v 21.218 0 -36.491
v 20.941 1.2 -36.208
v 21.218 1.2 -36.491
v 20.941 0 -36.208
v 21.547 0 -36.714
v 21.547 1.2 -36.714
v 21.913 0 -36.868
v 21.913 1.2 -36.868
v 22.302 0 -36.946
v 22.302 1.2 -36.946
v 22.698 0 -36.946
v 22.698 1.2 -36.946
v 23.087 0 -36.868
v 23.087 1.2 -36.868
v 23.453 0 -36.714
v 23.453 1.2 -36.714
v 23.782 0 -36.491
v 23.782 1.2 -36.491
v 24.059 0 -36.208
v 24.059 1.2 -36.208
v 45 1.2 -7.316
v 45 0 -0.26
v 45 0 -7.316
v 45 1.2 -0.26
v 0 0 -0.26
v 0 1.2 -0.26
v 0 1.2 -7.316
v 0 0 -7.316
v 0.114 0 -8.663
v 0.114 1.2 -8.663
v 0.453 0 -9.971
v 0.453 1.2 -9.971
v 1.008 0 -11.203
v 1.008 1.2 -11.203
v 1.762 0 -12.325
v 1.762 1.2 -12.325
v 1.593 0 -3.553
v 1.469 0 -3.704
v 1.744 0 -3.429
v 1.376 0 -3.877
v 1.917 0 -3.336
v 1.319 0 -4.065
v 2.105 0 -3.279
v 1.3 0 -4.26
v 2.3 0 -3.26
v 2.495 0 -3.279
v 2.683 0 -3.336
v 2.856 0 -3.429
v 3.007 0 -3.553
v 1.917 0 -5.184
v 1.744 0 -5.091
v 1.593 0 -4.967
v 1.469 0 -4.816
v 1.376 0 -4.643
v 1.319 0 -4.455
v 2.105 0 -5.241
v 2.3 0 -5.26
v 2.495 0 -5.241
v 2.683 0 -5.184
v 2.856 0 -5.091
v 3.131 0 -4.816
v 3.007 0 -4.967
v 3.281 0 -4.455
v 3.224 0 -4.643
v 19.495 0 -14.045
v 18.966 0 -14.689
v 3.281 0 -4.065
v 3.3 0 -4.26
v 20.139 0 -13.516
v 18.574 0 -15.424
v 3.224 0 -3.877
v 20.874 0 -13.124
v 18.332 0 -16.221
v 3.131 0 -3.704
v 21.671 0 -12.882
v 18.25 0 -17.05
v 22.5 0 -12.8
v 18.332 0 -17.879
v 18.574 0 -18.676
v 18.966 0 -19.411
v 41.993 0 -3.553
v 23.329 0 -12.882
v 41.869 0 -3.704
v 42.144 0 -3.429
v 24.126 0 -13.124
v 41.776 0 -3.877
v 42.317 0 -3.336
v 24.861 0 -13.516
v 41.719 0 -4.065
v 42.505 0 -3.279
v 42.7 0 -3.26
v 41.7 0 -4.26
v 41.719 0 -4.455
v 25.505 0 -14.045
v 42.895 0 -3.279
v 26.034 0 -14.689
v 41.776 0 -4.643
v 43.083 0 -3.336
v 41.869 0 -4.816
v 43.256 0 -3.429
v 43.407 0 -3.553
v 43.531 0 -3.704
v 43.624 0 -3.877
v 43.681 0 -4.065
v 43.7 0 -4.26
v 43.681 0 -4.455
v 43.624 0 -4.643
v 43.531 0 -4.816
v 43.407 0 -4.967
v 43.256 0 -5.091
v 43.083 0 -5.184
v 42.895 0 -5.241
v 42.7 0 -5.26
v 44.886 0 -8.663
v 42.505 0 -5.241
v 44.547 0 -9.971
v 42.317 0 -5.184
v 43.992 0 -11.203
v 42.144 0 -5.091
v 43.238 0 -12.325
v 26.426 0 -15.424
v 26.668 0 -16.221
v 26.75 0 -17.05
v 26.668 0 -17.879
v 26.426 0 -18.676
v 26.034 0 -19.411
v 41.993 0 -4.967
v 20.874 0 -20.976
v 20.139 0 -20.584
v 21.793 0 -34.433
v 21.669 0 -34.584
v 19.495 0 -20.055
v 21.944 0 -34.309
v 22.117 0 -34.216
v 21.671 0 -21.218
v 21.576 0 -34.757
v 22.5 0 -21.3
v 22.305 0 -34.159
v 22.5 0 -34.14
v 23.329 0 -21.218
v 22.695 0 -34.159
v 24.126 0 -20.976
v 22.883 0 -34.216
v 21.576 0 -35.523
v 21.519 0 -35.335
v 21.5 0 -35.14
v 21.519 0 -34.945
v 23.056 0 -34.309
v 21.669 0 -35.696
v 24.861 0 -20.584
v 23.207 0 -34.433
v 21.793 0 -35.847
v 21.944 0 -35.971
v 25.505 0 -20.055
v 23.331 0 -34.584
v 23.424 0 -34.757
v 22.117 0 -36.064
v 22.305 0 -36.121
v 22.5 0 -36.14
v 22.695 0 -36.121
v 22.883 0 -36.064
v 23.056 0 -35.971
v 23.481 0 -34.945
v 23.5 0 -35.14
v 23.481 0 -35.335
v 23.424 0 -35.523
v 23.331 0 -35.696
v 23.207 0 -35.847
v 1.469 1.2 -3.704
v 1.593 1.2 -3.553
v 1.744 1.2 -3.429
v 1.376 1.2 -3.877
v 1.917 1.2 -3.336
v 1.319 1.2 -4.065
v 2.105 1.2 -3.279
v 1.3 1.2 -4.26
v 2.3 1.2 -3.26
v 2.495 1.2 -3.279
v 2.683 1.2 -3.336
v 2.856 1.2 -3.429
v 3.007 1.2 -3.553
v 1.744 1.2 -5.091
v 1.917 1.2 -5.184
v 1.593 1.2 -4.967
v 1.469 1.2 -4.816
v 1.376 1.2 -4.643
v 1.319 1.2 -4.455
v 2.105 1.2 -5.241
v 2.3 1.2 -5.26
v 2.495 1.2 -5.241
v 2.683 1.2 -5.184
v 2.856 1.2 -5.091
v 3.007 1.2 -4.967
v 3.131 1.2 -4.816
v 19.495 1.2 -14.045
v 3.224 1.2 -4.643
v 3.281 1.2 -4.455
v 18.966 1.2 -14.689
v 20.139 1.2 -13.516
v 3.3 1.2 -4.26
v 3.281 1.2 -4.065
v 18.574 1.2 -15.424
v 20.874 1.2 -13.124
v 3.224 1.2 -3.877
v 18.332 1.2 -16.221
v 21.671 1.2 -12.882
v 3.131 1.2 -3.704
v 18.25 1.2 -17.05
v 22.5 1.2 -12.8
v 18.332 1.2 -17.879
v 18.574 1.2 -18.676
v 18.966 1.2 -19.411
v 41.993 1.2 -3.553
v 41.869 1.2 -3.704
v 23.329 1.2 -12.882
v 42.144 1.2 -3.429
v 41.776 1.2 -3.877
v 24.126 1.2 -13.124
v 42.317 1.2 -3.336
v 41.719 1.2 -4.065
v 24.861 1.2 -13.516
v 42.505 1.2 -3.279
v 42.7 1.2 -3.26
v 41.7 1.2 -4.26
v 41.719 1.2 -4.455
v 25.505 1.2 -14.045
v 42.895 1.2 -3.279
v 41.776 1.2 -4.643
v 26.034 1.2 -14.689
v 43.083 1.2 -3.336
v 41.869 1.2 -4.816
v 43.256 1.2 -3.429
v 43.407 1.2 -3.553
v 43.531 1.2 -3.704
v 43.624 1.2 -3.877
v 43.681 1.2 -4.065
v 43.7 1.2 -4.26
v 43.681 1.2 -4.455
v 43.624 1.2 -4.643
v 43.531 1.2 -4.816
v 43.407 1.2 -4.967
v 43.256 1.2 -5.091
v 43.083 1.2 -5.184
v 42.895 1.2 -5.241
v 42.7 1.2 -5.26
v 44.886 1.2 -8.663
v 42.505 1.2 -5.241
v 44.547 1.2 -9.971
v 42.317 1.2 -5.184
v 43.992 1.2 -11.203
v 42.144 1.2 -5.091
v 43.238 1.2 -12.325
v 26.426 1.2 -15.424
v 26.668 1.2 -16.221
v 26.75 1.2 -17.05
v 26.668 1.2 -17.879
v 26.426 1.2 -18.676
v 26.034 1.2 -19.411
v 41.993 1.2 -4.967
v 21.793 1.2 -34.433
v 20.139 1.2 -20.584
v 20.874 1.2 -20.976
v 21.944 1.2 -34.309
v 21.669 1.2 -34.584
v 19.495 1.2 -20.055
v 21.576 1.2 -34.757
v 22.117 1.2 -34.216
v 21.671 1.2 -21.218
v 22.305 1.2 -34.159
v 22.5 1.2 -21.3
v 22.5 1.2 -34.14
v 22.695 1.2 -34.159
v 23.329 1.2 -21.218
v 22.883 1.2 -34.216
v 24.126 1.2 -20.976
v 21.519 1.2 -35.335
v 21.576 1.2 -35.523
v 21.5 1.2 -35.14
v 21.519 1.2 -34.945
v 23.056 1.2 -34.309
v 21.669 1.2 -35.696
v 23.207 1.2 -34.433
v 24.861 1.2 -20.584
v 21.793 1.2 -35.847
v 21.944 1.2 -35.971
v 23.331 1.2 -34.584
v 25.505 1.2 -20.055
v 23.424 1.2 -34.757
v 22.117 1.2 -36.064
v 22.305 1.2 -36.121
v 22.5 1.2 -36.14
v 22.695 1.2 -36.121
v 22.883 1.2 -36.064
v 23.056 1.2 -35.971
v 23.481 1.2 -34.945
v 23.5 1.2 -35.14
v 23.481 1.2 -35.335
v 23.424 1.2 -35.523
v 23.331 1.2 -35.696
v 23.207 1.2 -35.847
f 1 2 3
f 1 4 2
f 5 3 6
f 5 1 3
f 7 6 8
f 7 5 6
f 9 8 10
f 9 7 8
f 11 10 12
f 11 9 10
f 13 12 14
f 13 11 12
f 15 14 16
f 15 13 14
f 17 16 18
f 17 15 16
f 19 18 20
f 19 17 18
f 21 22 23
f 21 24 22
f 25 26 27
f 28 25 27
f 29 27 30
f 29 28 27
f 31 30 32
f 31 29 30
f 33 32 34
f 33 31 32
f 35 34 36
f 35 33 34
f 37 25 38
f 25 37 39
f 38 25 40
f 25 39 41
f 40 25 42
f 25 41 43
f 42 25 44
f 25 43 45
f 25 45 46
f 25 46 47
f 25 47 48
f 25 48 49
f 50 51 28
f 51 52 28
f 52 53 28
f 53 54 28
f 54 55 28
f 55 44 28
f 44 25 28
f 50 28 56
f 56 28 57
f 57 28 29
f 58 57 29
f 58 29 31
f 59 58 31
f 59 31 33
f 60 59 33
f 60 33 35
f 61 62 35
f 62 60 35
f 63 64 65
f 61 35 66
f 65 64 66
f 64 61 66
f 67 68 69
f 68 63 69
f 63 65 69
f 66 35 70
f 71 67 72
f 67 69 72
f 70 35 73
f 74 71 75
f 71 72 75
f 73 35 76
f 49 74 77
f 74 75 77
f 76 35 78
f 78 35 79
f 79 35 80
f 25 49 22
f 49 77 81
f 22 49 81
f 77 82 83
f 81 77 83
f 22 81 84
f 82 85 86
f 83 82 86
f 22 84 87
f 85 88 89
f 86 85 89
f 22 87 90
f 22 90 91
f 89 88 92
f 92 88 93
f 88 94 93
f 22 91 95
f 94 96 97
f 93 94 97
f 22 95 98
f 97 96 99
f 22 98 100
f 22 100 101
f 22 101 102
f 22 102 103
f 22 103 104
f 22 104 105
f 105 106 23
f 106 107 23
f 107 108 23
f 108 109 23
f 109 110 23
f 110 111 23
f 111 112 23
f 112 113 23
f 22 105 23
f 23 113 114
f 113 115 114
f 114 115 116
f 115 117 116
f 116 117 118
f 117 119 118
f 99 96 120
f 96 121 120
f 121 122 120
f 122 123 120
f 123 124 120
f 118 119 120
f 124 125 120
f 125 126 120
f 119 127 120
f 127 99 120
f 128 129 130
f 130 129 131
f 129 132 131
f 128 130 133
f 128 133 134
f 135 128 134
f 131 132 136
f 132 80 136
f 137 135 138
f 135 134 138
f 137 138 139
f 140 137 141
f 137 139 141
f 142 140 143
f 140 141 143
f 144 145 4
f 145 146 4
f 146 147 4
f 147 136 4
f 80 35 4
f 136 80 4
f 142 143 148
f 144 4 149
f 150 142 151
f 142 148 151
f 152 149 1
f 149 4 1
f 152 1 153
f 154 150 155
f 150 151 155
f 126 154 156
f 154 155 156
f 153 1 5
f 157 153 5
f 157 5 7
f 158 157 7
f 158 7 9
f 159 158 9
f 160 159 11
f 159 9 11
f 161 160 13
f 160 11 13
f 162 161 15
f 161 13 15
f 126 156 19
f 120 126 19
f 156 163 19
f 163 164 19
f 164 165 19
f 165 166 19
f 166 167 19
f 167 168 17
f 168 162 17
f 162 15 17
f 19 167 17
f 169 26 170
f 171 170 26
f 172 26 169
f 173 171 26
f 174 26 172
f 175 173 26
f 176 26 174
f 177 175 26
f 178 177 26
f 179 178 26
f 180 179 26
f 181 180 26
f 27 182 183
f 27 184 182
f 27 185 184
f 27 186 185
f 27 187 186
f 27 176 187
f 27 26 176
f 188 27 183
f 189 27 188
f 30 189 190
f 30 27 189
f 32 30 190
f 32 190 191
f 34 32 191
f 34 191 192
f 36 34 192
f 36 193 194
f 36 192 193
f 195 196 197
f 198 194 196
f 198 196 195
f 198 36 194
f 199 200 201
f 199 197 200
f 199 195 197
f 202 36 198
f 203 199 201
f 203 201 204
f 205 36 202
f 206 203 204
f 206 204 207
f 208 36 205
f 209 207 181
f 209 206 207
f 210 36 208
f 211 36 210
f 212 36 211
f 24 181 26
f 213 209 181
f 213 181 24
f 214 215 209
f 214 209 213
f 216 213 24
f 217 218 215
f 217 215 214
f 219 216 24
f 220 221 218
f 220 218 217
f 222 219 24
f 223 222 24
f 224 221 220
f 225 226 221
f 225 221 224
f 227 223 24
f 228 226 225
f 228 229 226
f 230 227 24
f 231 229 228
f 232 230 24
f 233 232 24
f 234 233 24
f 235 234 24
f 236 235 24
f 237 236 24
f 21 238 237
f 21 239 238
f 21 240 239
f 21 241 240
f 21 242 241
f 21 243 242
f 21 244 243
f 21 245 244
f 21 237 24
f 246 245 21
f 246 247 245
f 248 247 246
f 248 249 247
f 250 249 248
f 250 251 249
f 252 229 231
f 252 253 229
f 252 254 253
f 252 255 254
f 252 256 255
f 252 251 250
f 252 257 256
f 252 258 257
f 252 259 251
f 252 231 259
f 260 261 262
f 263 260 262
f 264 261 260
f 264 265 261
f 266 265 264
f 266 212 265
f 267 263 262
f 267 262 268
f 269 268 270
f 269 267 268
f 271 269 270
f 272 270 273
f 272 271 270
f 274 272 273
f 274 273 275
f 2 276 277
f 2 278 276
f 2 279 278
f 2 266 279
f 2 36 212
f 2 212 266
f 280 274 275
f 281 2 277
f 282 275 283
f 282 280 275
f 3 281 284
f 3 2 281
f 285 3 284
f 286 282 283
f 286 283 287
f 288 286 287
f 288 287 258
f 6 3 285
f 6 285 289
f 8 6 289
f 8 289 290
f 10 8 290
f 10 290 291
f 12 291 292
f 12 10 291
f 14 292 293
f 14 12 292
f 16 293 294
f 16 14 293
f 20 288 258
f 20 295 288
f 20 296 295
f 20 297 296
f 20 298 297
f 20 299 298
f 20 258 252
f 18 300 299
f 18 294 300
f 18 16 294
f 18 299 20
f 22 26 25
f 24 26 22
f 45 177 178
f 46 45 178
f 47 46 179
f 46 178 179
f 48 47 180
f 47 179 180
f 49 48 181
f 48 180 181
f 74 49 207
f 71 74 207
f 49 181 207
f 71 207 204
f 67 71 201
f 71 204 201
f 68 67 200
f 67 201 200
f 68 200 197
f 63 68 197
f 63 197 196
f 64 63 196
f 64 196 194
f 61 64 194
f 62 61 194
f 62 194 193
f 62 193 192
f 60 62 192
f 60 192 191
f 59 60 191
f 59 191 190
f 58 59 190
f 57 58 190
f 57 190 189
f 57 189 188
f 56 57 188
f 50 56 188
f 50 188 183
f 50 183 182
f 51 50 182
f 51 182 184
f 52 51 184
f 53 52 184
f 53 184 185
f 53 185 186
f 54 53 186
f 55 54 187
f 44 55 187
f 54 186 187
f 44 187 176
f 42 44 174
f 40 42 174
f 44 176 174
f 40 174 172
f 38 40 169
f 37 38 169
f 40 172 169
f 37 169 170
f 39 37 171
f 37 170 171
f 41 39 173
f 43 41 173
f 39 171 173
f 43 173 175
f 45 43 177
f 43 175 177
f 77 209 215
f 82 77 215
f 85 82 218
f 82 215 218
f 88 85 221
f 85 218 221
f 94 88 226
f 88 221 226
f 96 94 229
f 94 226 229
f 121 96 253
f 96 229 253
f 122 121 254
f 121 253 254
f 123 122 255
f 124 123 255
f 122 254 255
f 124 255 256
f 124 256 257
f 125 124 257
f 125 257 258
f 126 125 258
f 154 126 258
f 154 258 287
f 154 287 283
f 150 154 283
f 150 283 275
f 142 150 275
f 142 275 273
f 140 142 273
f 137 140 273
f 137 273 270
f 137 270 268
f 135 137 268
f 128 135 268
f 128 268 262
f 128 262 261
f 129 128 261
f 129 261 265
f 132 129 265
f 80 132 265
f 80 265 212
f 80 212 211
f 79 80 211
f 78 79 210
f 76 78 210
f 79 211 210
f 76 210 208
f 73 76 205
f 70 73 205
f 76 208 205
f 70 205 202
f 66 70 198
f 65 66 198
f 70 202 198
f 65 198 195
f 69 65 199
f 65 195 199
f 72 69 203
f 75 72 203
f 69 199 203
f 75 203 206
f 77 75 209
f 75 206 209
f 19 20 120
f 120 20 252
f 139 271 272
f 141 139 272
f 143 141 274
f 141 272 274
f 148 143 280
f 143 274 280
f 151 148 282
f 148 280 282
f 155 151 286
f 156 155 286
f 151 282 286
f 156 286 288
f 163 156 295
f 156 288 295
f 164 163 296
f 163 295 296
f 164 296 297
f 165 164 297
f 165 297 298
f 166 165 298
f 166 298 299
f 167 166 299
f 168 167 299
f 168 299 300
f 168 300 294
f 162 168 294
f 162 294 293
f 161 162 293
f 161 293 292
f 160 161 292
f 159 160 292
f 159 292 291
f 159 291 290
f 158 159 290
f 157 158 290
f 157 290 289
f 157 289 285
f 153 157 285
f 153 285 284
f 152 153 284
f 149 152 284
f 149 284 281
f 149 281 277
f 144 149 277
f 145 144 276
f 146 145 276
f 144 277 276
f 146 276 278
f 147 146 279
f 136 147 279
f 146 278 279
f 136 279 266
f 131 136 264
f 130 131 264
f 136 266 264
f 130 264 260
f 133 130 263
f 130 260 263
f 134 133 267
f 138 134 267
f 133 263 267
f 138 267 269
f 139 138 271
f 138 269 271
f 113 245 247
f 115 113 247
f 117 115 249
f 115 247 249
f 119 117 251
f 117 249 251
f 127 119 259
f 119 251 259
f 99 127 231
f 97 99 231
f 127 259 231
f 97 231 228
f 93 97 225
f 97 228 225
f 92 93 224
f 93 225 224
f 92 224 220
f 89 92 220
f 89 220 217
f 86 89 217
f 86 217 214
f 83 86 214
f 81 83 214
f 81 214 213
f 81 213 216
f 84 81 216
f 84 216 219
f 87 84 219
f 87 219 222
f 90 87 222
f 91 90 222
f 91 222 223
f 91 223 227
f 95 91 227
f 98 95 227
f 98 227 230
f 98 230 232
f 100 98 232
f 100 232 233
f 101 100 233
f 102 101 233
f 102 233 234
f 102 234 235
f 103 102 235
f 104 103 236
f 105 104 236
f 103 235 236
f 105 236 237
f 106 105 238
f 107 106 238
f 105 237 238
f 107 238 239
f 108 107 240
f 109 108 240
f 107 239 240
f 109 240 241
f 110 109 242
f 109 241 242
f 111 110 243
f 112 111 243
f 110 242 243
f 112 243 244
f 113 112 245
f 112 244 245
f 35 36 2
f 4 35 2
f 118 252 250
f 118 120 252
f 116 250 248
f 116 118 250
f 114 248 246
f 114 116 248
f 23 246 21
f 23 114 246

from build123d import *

# Parameters (mm, degrees)
SKETCH_1_W          = 45
SKETCH_1_H          = 8
SKETCH_1_R          = 1
EXTRUDE_1_DEPTH     = 1.2
SKETCH_2_W          = 45
SKETCH_2_H          = 30.15
SKETCH_2_R          = 1
SKETCH_2_R_2        = 4.25
EXTRUDE_2_DEPTH     = 1.2
CUT_EXTRUDE_1_DEPTH = 60.007308869
FILLET_2_R          = 8
FILLET_3_R          = 2
EXTRUDE_START       = -1.2
SKETCH_7_R          = 1
SKETCH_7_W          = 45
SKETCH_7_H          = 0.26
EXTRUDE_3_DEPTH     = 1.2
SKETCH_8_W          = 45
SKETCH_8_H          = 0.26
CUT_EXTRUDE_2_DEPTH = 59.24231093
SKETCH_9_R          = 1
CUT_EXTRUDE_3_DEPTH = 59.24231093
SKETCH_10_R         = 4.25
SKETCH_10_R_2       = 1
EXTRUDE_4_DEPTH     = 1.2
SKETCH_11_R         = 4.25
SKETCH_11_R_2       = 1
CUT_EXTRUDE_4_DEPTH = 59.24231093


with BuildPart() as part:
    # ｽｹｯﾁ1 → ﾎﾞｽ - 押し出し1 (new body)
    with BuildSketch(Plane(origin=(0, 0, 0), x_dir=(1, 0, 0), z_dir=(0, 1, 0))):
        with Locations((22.5, 4)):
            Rectangle(SKETCH_1_W, SKETCH_1_H)
        with Locations(Location((2, 3.78, 0), (0, 0, 270))):
            Circle(SKETCH_1_R, mode=Mode.SUBTRACT)
        with Locations(Location((43, 3.78, 0), (0, 0, 90))):
            Circle(SKETCH_1_R, mode=Mode.SUBTRACT)
    extrude(amount=EXTRUDE_1_DEPTH)

    # ｽｹｯﾁ2 → ﾎﾞｽ - 押し出し2 (add)
    with BuildSketch(Plane(origin=(0, 1.2, 0), x_dir=(1, 0, 0), z_dir=(0, 1, 0))):
        with Locations((22.5, 23.075)):
            Rectangle(SKETCH_2_W, SKETCH_2_H)
        with Locations(Location((22.5, 35.15, 0), (0, 0, 270))):
            Circle(SKETCH_2_R, mode=Mode.SUBTRACT)
        with Locations(Location((22.5, 17.1, 0), (0, 0, 270))):
            Circle(SKETCH_2_R_2, mode=Mode.SUBTRACT)
    extrude(amount=-EXTRUDE_2_DEPTH)

    # ｽｹｯﾁ6 → ｶｯﾄ - 押し出し1 (cut, through all)
    with BuildSketch(Plane(origin=(0, 1.2, 0), x_dir=(1, 0, 0), z_dir=(0, 1, 0))):
        Polygon((0, 38.15), (0, 10.130291319), (22.5, 38.15), align=None)
        Polygon((45, 38.15), (22.5, 38.15), (45, 10.130291319), align=None)
    extrude(amount=-CUT_EXTRUDE_1_DEPTH, mode=Mode.SUBTRACT)

    # ﾌｨﾚｯﾄ2
    fillet_2_edges = [part.edges().sort_by_distance(p)[0] for p in [
        (45, 0.6, -10.130291319),
        (0, 0.6, -10.130291319),
    ]]
    fillet(fillet_2_edges, radius=FILLET_2_R)

    # ﾌｨﾚｯﾄ3
    fillet_3_edges = [part.edges().sort_by_distance(p)[0] for p in [
        (22.5, 0.6, -38.15),
    ]]
    fillet(fillet_3_edges, radius=FILLET_3_R)

    # ｽｹｯﾁ7 → ﾎﾞｽ - 押し出し3 (add)
    with BuildSketch(Plane(origin=(0, 1.2, 0), x_dir=(1, 0, 0), z_dir=(0, 1, 0)).offset(EXTRUDE_START)):
        with Locations((2, 3.78)):
            Circle(SKETCH_7_R)
        with Locations((43, 3.78)):
            Circle(SKETCH_7_R)
        with Locations((22.5, 0.13)):
            Rectangle(SKETCH_7_W, SKETCH_7_H)
    extrude(amount=EXTRUDE_3_DEPTH)

    # ｽｹｯﾁ8 → ｶｯﾄ - 押し出し2 (cut, through all)
    with BuildSketch(Plane(origin=(0, 1.2, 0), x_dir=(1, 0, 0), z_dir=(0, 1, 0))):
        with Locations((22.5, 0.13)):
            Rectangle(SKETCH_8_W, SKETCH_8_H)
    extrude(amount=-CUT_EXTRUDE_2_DEPTH, mode=Mode.SUBTRACT)

    # ｽｹｯﾁ9 → ｶｯﾄ - 押し出し3 (cut, through all)
    with BuildSketch(Plane(origin=(0, 1.2, 0), x_dir=(1, 0, 0), z_dir=(0, 1, 0))):
        with Locations(Location((2.3, 4.26, 0), (0, 0, 270))):
            Circle(SKETCH_9_R)
        with Locations(Location((42.7, 4.26, 0), (0, 0, 90))):
            Circle(SKETCH_9_R)
    extrude(amount=-CUT_EXTRUDE_3_DEPTH, mode=Mode.SUBTRACT)

    # ｽｹｯﾁ10 → ﾎﾞｽ - 押し出し4 (add)
    with BuildSketch(Plane(origin=(0, 1.2, 0), x_dir=(1, 0, 0), z_dir=(0, 1, 0))):
        with Locations((22.5, 17.1)):
            Circle(SKETCH_10_R)
        with Locations((22.5, 35.15)):
            Circle(SKETCH_10_R_2)
    extrude(amount=-EXTRUDE_4_DEPTH)

    # ｽｹｯﾁ11 → ｶｯﾄ - 押し出し4 (cut, through all)
    with BuildSketch(Plane(origin=(0, 1.2, 0), x_dir=(1, 0, 0), z_dir=(0, 1, 0))):
        with Locations(Location((22.5, 17.05, 0), (0, 0, 270))):
            Circle(SKETCH_11_R)
        with Locations(Location((22.5, 35.14, 0), (0, 0, 270))):
            Circle(SKETCH_11_R_2)
    extrude(amount=-CUT_EXTRUDE_4_DEPTH, mode=Mode.SUBTRACT)


solid = part.part
